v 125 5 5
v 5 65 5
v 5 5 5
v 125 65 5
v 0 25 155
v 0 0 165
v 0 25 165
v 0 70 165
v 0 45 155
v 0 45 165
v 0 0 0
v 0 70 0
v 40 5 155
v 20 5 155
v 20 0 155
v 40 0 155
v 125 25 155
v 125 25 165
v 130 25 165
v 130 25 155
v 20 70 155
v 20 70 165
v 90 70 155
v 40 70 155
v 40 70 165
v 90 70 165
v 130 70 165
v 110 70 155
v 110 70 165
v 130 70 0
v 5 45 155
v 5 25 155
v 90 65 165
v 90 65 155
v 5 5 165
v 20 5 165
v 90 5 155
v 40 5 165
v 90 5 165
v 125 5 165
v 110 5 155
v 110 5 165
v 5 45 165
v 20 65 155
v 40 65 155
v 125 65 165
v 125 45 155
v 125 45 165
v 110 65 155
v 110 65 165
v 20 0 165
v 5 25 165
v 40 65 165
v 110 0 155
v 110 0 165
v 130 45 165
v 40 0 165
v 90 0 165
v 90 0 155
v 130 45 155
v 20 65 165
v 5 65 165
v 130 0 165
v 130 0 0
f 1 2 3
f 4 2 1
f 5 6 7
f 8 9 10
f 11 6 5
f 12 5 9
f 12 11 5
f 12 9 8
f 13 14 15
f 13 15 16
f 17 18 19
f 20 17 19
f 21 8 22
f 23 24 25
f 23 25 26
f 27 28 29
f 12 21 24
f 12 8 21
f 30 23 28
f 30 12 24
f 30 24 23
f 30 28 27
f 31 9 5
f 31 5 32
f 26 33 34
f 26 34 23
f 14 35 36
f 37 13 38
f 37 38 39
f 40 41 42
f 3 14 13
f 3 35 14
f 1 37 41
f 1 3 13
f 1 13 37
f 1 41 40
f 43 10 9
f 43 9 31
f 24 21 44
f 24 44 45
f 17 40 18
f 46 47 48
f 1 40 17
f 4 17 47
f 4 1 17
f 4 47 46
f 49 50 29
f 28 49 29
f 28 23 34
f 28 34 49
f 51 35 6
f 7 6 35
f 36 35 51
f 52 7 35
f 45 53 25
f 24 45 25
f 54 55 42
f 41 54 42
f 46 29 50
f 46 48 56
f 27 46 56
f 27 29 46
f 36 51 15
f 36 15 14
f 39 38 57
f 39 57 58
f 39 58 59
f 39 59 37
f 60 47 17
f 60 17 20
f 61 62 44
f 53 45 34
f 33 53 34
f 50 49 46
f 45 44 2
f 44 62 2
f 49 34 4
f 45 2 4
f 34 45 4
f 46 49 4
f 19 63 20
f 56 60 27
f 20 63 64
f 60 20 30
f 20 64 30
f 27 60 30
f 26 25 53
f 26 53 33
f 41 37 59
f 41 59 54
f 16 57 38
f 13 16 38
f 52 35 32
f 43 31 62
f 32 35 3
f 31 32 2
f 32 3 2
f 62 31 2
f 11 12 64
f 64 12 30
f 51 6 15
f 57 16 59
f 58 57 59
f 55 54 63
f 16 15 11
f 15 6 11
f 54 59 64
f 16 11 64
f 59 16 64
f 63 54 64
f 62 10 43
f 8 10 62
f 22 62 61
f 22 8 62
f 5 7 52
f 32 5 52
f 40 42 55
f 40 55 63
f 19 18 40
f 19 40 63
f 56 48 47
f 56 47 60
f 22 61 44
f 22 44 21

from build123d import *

# Parameters (mm, degrees)
F0_W     = 130
F0_H     = 70
F1_DEPTH = 5
F2_W     = 130
F2_H     = 70
F2_W_2   = 120
F2_H_2   = 60
F3_DEPTH = 160
F4_W     = 20
F4_H     = 25
F4_H_2   = 20
F4_W_2   = 50
F5_DEPTH = 10


with BuildPart() as f1:
    # F0 (on Top) → F1 (new body)
    with BuildSketch(Plane.XY):
        with Locations((65, 35)):
            Rectangle(F0_W, F0_H)
    extrude(amount=F1_DEPTH)

    # F2 (on face) → F3 (join)
    with BuildSketch(Plane.XY.offset(5)):
        with Locations((65, 35)):
            Rectangle(F2_W, F2_H)
        with Locations((65, 35)):
            Rectangle(F2_W_2, F2_H_2, mode=Mode.SUBTRACT)
    extrude(amount=F3_DEPTH)

    # F4 (on face) → F5 (cut)
    with BuildSketch(Plane.XY.offset(165)):
        with Locations((30, 12.5)):
            Rectangle(F4_W, F4_H)
        with Locations((10, 35)):
            Rectangle(F4_W, F4_H_2)
        with Locations((65, 35)):
            Rectangle(F4_W_2, F4_H_2)
        with Locations((30, 57.5)):
            Rectangle(F4_W, F4_H)
        with Locations((100, 12.5)):
            Rectangle(F4_W, F4_H)
        with Locations((100, 57.5)):
            Rectangle(F4_W, F4_H)
        with Locations((120, 35)):
            Rectangle(F4_W, F4_H_2)
    extrude(amount=-F5_DEPTH, mode=Mode.SUBTRACT)


solid = f1.part
